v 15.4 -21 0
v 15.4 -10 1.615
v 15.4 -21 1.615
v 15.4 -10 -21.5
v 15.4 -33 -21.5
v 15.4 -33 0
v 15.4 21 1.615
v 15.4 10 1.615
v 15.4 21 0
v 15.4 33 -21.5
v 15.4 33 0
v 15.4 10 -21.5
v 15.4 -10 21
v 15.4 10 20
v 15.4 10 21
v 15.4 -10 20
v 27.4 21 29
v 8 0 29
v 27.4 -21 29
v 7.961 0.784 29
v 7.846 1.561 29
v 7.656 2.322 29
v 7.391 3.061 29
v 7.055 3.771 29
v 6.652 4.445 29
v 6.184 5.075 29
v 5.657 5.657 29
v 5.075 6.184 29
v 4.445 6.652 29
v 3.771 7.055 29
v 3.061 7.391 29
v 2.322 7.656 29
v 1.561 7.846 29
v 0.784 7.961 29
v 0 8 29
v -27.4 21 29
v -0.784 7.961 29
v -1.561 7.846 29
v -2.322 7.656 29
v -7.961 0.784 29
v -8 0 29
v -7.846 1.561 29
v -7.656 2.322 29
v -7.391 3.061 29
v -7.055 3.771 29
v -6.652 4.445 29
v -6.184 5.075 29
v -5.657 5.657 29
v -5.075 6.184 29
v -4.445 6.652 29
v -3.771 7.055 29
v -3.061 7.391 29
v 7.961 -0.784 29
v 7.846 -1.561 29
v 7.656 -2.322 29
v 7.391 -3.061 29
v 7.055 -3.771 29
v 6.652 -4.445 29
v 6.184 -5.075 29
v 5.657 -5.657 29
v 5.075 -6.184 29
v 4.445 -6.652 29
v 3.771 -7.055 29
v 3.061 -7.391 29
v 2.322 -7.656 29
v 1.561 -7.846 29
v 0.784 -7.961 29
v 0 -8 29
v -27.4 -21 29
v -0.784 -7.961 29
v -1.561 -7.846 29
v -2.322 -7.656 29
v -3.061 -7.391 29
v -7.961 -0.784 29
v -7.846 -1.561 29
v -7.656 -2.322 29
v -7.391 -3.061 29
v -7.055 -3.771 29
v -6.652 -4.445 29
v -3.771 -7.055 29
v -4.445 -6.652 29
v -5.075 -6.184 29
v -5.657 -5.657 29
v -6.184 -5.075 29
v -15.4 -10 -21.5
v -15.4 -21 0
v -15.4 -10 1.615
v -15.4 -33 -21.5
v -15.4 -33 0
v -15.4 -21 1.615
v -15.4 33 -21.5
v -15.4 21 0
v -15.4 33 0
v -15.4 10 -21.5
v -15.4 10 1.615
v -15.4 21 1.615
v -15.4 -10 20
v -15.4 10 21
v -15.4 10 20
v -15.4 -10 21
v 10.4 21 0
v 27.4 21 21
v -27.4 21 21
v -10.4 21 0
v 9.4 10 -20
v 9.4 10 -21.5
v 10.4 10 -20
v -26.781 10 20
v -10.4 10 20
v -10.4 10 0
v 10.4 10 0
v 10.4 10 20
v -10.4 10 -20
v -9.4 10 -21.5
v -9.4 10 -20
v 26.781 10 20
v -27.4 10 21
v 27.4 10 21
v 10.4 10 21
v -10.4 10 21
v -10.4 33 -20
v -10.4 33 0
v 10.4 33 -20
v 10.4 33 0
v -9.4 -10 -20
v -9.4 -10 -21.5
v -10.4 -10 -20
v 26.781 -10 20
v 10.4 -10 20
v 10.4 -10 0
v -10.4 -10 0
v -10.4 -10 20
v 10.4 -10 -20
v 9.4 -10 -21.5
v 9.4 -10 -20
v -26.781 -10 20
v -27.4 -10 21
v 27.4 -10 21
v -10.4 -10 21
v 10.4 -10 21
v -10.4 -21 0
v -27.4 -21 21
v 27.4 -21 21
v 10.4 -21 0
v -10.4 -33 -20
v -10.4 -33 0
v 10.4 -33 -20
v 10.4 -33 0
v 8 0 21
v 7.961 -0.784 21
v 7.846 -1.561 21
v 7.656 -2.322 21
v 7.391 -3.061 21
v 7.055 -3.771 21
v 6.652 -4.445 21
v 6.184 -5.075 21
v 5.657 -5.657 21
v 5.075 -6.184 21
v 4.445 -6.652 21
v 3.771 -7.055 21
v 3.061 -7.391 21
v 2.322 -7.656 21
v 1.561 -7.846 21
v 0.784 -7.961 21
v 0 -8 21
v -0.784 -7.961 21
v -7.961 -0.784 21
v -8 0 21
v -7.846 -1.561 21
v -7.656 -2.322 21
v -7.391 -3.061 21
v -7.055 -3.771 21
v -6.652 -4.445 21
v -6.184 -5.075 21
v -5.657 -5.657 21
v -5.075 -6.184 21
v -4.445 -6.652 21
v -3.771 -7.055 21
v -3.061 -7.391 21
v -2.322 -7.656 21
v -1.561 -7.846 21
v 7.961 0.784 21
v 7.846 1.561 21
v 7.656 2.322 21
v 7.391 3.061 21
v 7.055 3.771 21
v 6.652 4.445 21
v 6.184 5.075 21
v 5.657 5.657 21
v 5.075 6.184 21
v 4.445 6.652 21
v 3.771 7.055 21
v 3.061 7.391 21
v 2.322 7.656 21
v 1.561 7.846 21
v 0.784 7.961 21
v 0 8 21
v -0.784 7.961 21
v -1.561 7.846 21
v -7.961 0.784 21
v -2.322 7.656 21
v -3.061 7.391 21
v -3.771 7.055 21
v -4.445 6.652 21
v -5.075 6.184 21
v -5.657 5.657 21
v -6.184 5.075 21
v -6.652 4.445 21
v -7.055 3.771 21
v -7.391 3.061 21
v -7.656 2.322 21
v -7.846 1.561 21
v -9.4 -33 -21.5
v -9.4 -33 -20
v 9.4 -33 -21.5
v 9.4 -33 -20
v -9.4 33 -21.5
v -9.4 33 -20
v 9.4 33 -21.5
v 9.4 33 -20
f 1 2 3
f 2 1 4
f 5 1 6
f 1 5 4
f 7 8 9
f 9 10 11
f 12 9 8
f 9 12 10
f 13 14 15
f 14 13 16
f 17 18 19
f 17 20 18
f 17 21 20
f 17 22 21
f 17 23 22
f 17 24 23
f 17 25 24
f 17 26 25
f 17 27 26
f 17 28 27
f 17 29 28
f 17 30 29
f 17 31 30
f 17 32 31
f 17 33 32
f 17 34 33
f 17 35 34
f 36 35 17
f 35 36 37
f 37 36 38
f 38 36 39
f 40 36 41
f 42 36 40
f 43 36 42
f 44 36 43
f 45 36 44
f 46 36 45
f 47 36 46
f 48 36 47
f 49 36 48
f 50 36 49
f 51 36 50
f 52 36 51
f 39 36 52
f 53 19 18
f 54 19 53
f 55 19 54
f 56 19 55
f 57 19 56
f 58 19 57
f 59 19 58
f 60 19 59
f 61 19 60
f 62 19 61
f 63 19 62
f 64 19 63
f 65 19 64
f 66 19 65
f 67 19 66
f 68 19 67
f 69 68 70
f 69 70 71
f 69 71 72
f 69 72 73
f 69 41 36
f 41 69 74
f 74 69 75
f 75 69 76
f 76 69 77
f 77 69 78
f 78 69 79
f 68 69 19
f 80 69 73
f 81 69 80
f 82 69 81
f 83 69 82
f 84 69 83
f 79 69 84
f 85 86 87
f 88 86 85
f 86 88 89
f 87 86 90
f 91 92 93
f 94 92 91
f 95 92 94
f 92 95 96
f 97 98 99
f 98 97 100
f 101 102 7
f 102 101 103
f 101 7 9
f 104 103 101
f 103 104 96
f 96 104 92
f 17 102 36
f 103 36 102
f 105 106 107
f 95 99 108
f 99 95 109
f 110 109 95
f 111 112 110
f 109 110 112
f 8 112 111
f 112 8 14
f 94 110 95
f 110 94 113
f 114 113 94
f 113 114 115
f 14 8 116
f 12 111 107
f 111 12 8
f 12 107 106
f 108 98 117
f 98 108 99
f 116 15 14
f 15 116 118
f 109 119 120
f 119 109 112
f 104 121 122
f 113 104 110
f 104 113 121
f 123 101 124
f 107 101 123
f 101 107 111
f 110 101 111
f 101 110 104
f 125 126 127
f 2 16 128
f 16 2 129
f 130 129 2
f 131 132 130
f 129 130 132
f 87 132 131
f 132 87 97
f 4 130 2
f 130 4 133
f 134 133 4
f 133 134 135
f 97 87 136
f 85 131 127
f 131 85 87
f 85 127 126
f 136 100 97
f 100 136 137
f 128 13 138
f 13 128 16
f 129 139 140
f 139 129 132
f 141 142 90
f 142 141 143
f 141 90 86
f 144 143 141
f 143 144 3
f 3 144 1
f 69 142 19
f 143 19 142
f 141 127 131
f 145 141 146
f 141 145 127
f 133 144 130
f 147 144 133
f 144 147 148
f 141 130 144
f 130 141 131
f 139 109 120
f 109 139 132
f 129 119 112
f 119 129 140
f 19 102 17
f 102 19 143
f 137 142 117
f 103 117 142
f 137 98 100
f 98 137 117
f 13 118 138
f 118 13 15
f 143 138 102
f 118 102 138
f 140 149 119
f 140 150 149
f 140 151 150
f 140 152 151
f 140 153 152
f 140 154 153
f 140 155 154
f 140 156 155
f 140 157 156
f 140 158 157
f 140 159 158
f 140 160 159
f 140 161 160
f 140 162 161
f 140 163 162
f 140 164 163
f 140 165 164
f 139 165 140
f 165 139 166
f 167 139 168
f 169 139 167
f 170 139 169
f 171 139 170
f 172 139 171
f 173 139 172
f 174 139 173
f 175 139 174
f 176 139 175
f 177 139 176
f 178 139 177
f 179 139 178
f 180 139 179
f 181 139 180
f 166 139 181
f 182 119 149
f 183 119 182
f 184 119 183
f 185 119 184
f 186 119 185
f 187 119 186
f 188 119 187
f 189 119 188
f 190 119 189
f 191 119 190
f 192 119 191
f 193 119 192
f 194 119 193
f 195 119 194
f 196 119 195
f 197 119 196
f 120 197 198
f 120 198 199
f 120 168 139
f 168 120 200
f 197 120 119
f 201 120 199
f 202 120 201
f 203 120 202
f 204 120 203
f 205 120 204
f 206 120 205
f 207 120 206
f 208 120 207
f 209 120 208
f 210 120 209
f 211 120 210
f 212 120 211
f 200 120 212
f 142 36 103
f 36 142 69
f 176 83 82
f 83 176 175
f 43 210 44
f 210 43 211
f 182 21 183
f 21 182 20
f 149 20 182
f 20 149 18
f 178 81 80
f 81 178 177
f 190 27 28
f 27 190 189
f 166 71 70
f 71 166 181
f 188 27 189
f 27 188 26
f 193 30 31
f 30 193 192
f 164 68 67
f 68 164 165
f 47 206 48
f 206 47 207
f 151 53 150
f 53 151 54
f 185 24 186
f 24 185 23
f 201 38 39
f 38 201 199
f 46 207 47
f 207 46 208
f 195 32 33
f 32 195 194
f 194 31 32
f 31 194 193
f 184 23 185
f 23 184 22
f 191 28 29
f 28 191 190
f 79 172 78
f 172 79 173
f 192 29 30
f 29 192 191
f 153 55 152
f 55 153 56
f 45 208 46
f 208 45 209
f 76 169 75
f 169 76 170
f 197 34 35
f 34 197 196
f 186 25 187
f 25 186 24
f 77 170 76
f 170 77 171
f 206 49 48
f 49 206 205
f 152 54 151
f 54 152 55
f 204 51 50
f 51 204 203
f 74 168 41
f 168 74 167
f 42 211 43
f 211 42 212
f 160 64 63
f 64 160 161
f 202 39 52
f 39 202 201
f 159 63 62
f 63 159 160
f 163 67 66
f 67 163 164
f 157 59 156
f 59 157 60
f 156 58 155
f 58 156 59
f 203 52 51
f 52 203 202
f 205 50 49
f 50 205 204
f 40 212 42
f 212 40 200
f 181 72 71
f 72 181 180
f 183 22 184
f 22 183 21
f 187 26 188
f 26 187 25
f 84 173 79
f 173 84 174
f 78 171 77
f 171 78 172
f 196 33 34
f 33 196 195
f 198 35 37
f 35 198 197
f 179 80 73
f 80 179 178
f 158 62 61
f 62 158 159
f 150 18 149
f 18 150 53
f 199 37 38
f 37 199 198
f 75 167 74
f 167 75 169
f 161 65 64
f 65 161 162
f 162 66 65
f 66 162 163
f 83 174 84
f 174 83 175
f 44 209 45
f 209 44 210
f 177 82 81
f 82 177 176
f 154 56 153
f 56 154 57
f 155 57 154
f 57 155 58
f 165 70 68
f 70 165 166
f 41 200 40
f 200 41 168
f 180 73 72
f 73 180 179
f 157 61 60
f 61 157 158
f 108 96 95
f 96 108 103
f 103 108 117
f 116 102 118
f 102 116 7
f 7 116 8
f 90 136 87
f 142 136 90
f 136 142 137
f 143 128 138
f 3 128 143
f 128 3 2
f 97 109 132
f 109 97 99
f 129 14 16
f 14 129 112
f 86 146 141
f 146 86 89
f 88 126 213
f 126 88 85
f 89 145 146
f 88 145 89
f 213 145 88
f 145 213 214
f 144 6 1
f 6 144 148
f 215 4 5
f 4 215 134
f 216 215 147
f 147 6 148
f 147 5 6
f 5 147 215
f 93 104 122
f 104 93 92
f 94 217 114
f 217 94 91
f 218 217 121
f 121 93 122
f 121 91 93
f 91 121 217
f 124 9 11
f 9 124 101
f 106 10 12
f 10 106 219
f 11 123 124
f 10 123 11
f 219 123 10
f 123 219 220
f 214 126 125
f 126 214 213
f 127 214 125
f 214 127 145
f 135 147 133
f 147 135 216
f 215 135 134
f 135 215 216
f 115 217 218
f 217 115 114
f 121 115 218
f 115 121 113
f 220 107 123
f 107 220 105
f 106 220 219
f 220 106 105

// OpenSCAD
// file: ../perpendicular-u-joint-guard-v1.3-triangular-corner-fills/candidate_triangular_corner_fills.scad
// Candidate v1.3: four triangular concave-corner fill blocks.
//
// Base: accepted v0.7 eaves12 geometry. v0.9/v1.0/v1.1/v1.2 are not
// imported. Each corner block is a real triangular prism: broad at the roof,
// tapering continuously toward z=0, and overlapping the U side wall.

use <../perpendicular-u-joint-guard-v0.7/perpendicular_double_u_guard.scad>;

$fn = 48;
PART = "candidate_iso";

// Explicit v0.7 interface values.
roof_x_outer = 27.4;       // accepted eaves12 roof: -27.4..+27.4
side_wall_x_outer = 15.4;  // existing side-wall outer edge
blue_tube_x_outer = 10.0;  // blue lower 20x20 tube half-width
plate_y_inner = 10.0;
plate_y_outer = 21.0;
plate_depth_y = plate_y_outer - plate_y_inner; // 11 mm per front/back U plate

// The top edge is 0.5 mm inside the roof volume (roof underside z=21), and
// the lower point enters the side wall by 1 mm in X.  The XZ area therefore
// has positive overlap at both ends, not edge-only contact.
triangle_top_z = 21.5;
triangle_bottom_z = 0.0;
triangle_roof_overlap_z = triangle_top_z - 21.0;
triangle_side_overlap_x = 1.0;
triangle_inner_x = side_wall_x_outer - triangle_side_overlap_x; // 14.4

// Bottom retaining-hook contract copied from v0.7 for explicit verification.
hook_height_z = 1.5;
u_bottom_z = -21.0;
hook_top_z = u_bottom_z + hook_height_z; // -19.5

assert(plate_depth_y == 11, "每个三角块的前后板深必须是 11 mm");
assert(triangle_top_z > 21 && triangle_bottom_z == 0,
       "三角块上端必须搭入屋檐、下端落到 z=0");
assert(triangle_inner_x > blue_tube_x_outer,
       "三角块下端不得进入蓝色方管 x=-10..+10 包络");
assert(triangle_side_overlap_x > 0 && triangle_roof_overlap_z > 0,
       "三角块必须与屋檐和侧墙都有正重叠");
assert(hook_height_z == 1.5 && u_bottom_z == -21 && hook_top_z == -19.5,
       "底部卡脚必须保持 z=-21..-19.5");

// A polygon in XZ is extruded only through the corresponding front/back U
// plate. The center y=-10..+10 passage remains open.
module triangular_fill_xz(points, yc) {
    translate([0, yc, 0])
        rotate([90, 0, 0])
            linear_extrude(height = plate_depth_y,
                           center = true,
                           convexity = 10)
                polygon(points = points);
}

module front_neg_x_triangle() {
    // -X roof end -> +X inward. Top wide, lower point at the side wall.
    triangular_fill_xz([
        [-roof_x_outer, 21.0],
        [-triangle_inner_x, triangle_top_z],
        [-triangle_inner_x, triangle_bottom_z]
    ], (plate_y_inner + plate_y_outer) / 2);
}

module front_pos_x_triangle() {
    // +X roof end -> -X inward. Mirrored triangle.
    triangular_fill_xz([
        [roof_x_outer, 21.0],
        [triangle_inner_x, triangle_top_z],
        [triangle_inner_x, triangle_bottom_z]
    ], (plate_y_inner + plate_y_outer) / 2);
}

module back_neg_x_triangle() {
    triangular_fill_xz([
        [-roof_x_outer, 21.0],
        [-triangle_inner_x, triangle_top_z],
        [-triangle_inner_x, triangle_bottom_z]
    ], -(plate_y_inner + plate_y_outer) / 2);
}

module back_pos_x_triangle() {
    triangular_fill_xz([
        [roof_x_outer, 21.0],
        [triangle_inner_x, triangle_top_z],
        [triangle_inner_x, triangle_bottom_z]
    ], -(plate_y_inner + plate_y_outer) / 2);
}

module front_two_triangular_fills() {
    union() {
        front_neg_x_triangle();
        front_pos_x_triangle();
    }
}

module back_two_triangular_fills() {
    union() {
        back_neg_x_triangle();
        back_pos_x_triangle();
    }
}

module all_four_triangular_fills() {
    union() {
        front_two_triangular_fills();
        back_two_triangular_fills();
    }
}

module candidate_print_solid() {
    // Final hole operation is deliberately after the complete four-block
    // union; this preserves a true Z through-hole and the round nut pocket.
    difference() {
        union() {
            double_u_clip();
            all_four_triangular_fills();
        }
        vertical_screw_relief();
    }
}

module candidate_clip() {
    candidate_print_solid();
}

module candidate_assembly_iso() {
    upper_long_tube();
    lower_cross_tube();
    color([0.96, 0.39, 0.08]) double_u_clip();
    color([0.86, 0.13, 0.08]) front_two_triangular_fills();
    color([0.62, 0.12, 0.52]) back_two_triangular_fills();
    vertical_joint_screw();
}

module candidate_front_xz() {
    lower_cross_tube();
    color([0.96, 0.39, 0.08]) double_u_clip();
    color([0.86, 0.13, 0.08]) front_two_triangular_fills();
    vertical_joint_screw();
}

module candidate_back_xz() {
    lower_cross_tube();
    color([0.96, 0.39, 0.08]) double_u_clip();
    color([0.62, 0.12, 0.52]) back_two_triangular_fills();
    vertical_joint_screw();
}

module candidate_top_slice() {
    // At z=-0.5..2.5 the four blocks show their two front/back 11 mm bands;
    // the blue tube and the central y gap remain visible.
    slice_box = 200;
    color([0.28, 0.45, 0.78])
        intersection() {
            lower_cross_tube();
            translate([-slice_box / 2, -slice_box / 2, -0.5])
                cube([slice_box, slice_box, 3.0]);
        }
    color([0.96, 0.39, 0.08])
        intersection() {
            double_u_clip();
            translate([-slice_box / 2, -slice_box / 2, -0.5])
                cube([slice_box, slice_box, 3.0]);
        }
    color([0.86, 0.13, 0.08])
        intersection() {
            front_two_triangular_fills();
            translate([-slice_box / 2, -slice_box / 2, -0.5])
                cube([slice_box, slice_box, 3.0]);
        }
    color([0.62, 0.12, 0.52])
        intersection() {
            back_two_triangular_fills();
            translate([-slice_box / 2, -slice_box / 2, -0.5])
                cube([slice_box, slice_box, 3.0]);
        }
}

module candidate_hole_section() {
    // Center y=0 section: the bore and round nut pocket are shown without
    // confusing them with the bottom hook, which is outside this section.
    intersection() {
        candidate_print_solid();
        translate([-100, -0.4, -100]) cube([200, 0.8, 200]);
    }
}

module candidate_hook_check() {
    // Isolated lower detail: exact imported v0.7 U plate and blue tube, with
    // hook volumes highlighted only for review. This is not the print union.
    detail_box = 200;
    detail_z0 = -22;
    detail_h = 5;
    detail_y0 = 8;
    detail_ydepth = 15;
    intersection() {
        lower_cross_tube();
        translate([-detail_box / 2, detail_y0, detail_z0])
            cube([detail_box, detail_ydepth, detail_h]);
    }
    color([0.96, 0.39, 0.08])
        intersection() {
            u_plate(plate_y_inner, plate_y_outer);
            translate([-detail_box / 2, detail_y0, detail_z0])
                cube([detail_box, detail_ydepth, detail_h]);
        }
    color([0.20, 0.78, 0.20])
        intersection() {
            union() {
                translate([-13.65, 15.5, -20.25])
                    cube([3.5, 11, 1.5], center = true);
                translate([13.65, 15.5, -20.25])
                    cube([3.5, 11, 1.5], center = true);
            }
            translate([-detail_box / 2, detail_y0, detail_z0])
                cube([detail_box, detail_ydepth, detail_h]);
        }
}

if (PART == "candidate_clip") {
    candidate_clip();
} else if (PART == "candidate_front_xz") {
    candidate_front_xz();
} else if (PART == "candidate_back_xz") {
    candidate_back_xz();
} else if (PART == "candidate_top_slice") {
    candidate_top_slice();
} else if (PART == "candidate_hole_section") {
    candidate_hole_section();
} else if (PART == "candidate_hook_check") {
    candidate_hook_check();
} else {
    candidate_assembly_iso();
}
// file: ../perpendicular-u-joint-guard-v1.4-full-nut-passage/full_nut_passage_guard.scad
// v1.4: keep the exact v1.3 body; remove the nut-pocket floor with one
// full-depth Ø16 cylindrical subtraction. Units: mm; Z positive upwards.
// Imported v1.3 geometry contains all four triangles and the lower hooks.
use <../perpendicular-u-joint-guard-v1.3-triangular-corner-fills/candidate_triangular_corner_fills.scad>;

$fn = 48;
PART = "clip";
nut_passage_d = 16.0;

module full_depth_nut_passage() {
    // Cutter extends z=-31..39, past the whole printed z=-21..29 envelope.
    // 64 facets match the existing Ø16 pocket, avoiding a stepped profile.
    translate([0, 0, 4])
        cylinder(d = nut_passage_d, h = 70, center = true, $fn = 64);
}

module guard_v1_4() {
    difference() {
        candidate_print_solid();
        full_depth_nut_passage();
    }
}

guard_v1_4();
// file: ../perpendicular-u-joint-guard-v1.5-vertical-tube-clearance/vertical_tube_clearance_guard.scad
// v1.5: v1.4 Ø16 full nut passage + minimum downward-entry upper-tube slot.
// Units mm. X: upper long tube; Y: blue foot/front-back; Z: up.
use <../perpendicular-u-joint-guard-v1.4-full-nut-passage/full_nut_passage_guard.scad>;

$fn = 48;

module upper_pipe_vertical_entry_slot() {
    // Fixed gray upper tube: x=-60..60, y=-10..10, z=0..20.
    // While the clip moves down, that tube sweeps upward in clip coordinates.
    // A bottom-open slot ending at z=20 covers its whole relevant sweep in
    // the printed z=-21..29 envelope. Roof underside remains at z=21.
    // Preserve exact 20 mm Y width rather than silently adding fit clearance.
    translate([-60, -10, -31]) cube([120, 20, 51]);
}

module guard_v1_5() {
    difference() {
        guard_v1_4();
        upper_pipe_vertical_entry_slot();
    }
}

guard_v1_5();
// main file
// v1.8, mm. Rebuild the WHOLE lower U profile to the explicit 20+1.5 rule.
// Physical blue tube z=-20..0; contact wall height=20; inward lip below it
// z=-21.5..-20. No legacy u_bottom=-21 / lip top=-19.5 in the rebuilt lower.
use <../perpendicular-u-joint-guard-v1.5-vertical-tube-clearance/vertical_tube_clearance_guard.scad>;
use <../perpendicular-u-joint-guard-v1.4-full-nut-passage/full_nut_passage_guard.scad>;

$fn=48;
tube_size=20;
tube_top_z=0;
tube_bottom_z=tube_top_z-tube_size; // -20
lip_thickness_z=1.5;
lower_bottom_z=tube_bottom_z-lip_thickness_z; // -21.5
wall_thickness_x=5;
u_clearance_x=0.8;
inner_width_x=tube_size+u_clearance_x; // 20.8
outer_width_x=inner_width_x+2*wall_thickness_x; // 30.8
hook_depth_x=3.5;
u_inner_y=10;
u_outer_y=33; // original 21 + 12 mm along BLUE tube Y
upper_joint_overlap_z=0.1;

assert(tube_top_z-lower_bottom_z==21.5, "下部总高应为20+1.5=21.5 mm");
assert(2*u_inner_y==20, "中央Y通道应保持20 mm");

module upper_v1_5_preserved() {
    // Keep the accepted upper body. The 0.1 mm overlap is entirely within
    // the original arm footprint, ensuring a solid join without changing
    // the final upper shape or extending the new Y segments above z=0.
    intersection() {
        guard_v1_5();
        translate([-60,-60,-upper_joint_overlap_z])
            cube([120,120,70]);
    }
}

module lower_u_hooks() {
    // Same hook_depth_x, wall and X-clearance logic as the source v0.7 U.
    // Only Z is deliberately corrected to the new user's 20+1.5 definition.
    hook_xc=outer_width_x/2-wall_thickness_x/2-hook_depth_x/2; // 11.15
    for(yc=[-(u_inner_y+u_outer_y)/2,(u_inner_y+u_outer_y)/2])
        for(s=[-1,1])
            translate([s*hook_xc,yc,tube_bottom_z-lip_thickness_z/2])
                cube([hook_depth_x,u_outer_y-u_inner_y,lip_thickness_z],center=true);
}

module rebuilt_lower_u_pair() {
    wall_xc=inner_width_x/2+wall_thickness_x/2; // 12.9
    for(yc=[-(u_inner_y+u_outer_y)/2,(u_inner_y+u_outer_y)/2])
        for(s=[-1,1])
            translate([s*wall_xc,yc,(lower_bottom_z+tube_top_z)/2])
                cube([wall_thickness_x,u_outer_y-u_inner_y,
                      tube_top_z-lower_bottom_z],center=true);
    lower_u_hooks();
}

module guard_v1_8() {
    difference() {
        union() {
            upper_v1_5_preserved();
            rebuilt_lower_u_pair();
        }
        full_depth_nut_passage();
        upper_pipe_vertical_entry_slot();
    }
}

guard_v1_8();
